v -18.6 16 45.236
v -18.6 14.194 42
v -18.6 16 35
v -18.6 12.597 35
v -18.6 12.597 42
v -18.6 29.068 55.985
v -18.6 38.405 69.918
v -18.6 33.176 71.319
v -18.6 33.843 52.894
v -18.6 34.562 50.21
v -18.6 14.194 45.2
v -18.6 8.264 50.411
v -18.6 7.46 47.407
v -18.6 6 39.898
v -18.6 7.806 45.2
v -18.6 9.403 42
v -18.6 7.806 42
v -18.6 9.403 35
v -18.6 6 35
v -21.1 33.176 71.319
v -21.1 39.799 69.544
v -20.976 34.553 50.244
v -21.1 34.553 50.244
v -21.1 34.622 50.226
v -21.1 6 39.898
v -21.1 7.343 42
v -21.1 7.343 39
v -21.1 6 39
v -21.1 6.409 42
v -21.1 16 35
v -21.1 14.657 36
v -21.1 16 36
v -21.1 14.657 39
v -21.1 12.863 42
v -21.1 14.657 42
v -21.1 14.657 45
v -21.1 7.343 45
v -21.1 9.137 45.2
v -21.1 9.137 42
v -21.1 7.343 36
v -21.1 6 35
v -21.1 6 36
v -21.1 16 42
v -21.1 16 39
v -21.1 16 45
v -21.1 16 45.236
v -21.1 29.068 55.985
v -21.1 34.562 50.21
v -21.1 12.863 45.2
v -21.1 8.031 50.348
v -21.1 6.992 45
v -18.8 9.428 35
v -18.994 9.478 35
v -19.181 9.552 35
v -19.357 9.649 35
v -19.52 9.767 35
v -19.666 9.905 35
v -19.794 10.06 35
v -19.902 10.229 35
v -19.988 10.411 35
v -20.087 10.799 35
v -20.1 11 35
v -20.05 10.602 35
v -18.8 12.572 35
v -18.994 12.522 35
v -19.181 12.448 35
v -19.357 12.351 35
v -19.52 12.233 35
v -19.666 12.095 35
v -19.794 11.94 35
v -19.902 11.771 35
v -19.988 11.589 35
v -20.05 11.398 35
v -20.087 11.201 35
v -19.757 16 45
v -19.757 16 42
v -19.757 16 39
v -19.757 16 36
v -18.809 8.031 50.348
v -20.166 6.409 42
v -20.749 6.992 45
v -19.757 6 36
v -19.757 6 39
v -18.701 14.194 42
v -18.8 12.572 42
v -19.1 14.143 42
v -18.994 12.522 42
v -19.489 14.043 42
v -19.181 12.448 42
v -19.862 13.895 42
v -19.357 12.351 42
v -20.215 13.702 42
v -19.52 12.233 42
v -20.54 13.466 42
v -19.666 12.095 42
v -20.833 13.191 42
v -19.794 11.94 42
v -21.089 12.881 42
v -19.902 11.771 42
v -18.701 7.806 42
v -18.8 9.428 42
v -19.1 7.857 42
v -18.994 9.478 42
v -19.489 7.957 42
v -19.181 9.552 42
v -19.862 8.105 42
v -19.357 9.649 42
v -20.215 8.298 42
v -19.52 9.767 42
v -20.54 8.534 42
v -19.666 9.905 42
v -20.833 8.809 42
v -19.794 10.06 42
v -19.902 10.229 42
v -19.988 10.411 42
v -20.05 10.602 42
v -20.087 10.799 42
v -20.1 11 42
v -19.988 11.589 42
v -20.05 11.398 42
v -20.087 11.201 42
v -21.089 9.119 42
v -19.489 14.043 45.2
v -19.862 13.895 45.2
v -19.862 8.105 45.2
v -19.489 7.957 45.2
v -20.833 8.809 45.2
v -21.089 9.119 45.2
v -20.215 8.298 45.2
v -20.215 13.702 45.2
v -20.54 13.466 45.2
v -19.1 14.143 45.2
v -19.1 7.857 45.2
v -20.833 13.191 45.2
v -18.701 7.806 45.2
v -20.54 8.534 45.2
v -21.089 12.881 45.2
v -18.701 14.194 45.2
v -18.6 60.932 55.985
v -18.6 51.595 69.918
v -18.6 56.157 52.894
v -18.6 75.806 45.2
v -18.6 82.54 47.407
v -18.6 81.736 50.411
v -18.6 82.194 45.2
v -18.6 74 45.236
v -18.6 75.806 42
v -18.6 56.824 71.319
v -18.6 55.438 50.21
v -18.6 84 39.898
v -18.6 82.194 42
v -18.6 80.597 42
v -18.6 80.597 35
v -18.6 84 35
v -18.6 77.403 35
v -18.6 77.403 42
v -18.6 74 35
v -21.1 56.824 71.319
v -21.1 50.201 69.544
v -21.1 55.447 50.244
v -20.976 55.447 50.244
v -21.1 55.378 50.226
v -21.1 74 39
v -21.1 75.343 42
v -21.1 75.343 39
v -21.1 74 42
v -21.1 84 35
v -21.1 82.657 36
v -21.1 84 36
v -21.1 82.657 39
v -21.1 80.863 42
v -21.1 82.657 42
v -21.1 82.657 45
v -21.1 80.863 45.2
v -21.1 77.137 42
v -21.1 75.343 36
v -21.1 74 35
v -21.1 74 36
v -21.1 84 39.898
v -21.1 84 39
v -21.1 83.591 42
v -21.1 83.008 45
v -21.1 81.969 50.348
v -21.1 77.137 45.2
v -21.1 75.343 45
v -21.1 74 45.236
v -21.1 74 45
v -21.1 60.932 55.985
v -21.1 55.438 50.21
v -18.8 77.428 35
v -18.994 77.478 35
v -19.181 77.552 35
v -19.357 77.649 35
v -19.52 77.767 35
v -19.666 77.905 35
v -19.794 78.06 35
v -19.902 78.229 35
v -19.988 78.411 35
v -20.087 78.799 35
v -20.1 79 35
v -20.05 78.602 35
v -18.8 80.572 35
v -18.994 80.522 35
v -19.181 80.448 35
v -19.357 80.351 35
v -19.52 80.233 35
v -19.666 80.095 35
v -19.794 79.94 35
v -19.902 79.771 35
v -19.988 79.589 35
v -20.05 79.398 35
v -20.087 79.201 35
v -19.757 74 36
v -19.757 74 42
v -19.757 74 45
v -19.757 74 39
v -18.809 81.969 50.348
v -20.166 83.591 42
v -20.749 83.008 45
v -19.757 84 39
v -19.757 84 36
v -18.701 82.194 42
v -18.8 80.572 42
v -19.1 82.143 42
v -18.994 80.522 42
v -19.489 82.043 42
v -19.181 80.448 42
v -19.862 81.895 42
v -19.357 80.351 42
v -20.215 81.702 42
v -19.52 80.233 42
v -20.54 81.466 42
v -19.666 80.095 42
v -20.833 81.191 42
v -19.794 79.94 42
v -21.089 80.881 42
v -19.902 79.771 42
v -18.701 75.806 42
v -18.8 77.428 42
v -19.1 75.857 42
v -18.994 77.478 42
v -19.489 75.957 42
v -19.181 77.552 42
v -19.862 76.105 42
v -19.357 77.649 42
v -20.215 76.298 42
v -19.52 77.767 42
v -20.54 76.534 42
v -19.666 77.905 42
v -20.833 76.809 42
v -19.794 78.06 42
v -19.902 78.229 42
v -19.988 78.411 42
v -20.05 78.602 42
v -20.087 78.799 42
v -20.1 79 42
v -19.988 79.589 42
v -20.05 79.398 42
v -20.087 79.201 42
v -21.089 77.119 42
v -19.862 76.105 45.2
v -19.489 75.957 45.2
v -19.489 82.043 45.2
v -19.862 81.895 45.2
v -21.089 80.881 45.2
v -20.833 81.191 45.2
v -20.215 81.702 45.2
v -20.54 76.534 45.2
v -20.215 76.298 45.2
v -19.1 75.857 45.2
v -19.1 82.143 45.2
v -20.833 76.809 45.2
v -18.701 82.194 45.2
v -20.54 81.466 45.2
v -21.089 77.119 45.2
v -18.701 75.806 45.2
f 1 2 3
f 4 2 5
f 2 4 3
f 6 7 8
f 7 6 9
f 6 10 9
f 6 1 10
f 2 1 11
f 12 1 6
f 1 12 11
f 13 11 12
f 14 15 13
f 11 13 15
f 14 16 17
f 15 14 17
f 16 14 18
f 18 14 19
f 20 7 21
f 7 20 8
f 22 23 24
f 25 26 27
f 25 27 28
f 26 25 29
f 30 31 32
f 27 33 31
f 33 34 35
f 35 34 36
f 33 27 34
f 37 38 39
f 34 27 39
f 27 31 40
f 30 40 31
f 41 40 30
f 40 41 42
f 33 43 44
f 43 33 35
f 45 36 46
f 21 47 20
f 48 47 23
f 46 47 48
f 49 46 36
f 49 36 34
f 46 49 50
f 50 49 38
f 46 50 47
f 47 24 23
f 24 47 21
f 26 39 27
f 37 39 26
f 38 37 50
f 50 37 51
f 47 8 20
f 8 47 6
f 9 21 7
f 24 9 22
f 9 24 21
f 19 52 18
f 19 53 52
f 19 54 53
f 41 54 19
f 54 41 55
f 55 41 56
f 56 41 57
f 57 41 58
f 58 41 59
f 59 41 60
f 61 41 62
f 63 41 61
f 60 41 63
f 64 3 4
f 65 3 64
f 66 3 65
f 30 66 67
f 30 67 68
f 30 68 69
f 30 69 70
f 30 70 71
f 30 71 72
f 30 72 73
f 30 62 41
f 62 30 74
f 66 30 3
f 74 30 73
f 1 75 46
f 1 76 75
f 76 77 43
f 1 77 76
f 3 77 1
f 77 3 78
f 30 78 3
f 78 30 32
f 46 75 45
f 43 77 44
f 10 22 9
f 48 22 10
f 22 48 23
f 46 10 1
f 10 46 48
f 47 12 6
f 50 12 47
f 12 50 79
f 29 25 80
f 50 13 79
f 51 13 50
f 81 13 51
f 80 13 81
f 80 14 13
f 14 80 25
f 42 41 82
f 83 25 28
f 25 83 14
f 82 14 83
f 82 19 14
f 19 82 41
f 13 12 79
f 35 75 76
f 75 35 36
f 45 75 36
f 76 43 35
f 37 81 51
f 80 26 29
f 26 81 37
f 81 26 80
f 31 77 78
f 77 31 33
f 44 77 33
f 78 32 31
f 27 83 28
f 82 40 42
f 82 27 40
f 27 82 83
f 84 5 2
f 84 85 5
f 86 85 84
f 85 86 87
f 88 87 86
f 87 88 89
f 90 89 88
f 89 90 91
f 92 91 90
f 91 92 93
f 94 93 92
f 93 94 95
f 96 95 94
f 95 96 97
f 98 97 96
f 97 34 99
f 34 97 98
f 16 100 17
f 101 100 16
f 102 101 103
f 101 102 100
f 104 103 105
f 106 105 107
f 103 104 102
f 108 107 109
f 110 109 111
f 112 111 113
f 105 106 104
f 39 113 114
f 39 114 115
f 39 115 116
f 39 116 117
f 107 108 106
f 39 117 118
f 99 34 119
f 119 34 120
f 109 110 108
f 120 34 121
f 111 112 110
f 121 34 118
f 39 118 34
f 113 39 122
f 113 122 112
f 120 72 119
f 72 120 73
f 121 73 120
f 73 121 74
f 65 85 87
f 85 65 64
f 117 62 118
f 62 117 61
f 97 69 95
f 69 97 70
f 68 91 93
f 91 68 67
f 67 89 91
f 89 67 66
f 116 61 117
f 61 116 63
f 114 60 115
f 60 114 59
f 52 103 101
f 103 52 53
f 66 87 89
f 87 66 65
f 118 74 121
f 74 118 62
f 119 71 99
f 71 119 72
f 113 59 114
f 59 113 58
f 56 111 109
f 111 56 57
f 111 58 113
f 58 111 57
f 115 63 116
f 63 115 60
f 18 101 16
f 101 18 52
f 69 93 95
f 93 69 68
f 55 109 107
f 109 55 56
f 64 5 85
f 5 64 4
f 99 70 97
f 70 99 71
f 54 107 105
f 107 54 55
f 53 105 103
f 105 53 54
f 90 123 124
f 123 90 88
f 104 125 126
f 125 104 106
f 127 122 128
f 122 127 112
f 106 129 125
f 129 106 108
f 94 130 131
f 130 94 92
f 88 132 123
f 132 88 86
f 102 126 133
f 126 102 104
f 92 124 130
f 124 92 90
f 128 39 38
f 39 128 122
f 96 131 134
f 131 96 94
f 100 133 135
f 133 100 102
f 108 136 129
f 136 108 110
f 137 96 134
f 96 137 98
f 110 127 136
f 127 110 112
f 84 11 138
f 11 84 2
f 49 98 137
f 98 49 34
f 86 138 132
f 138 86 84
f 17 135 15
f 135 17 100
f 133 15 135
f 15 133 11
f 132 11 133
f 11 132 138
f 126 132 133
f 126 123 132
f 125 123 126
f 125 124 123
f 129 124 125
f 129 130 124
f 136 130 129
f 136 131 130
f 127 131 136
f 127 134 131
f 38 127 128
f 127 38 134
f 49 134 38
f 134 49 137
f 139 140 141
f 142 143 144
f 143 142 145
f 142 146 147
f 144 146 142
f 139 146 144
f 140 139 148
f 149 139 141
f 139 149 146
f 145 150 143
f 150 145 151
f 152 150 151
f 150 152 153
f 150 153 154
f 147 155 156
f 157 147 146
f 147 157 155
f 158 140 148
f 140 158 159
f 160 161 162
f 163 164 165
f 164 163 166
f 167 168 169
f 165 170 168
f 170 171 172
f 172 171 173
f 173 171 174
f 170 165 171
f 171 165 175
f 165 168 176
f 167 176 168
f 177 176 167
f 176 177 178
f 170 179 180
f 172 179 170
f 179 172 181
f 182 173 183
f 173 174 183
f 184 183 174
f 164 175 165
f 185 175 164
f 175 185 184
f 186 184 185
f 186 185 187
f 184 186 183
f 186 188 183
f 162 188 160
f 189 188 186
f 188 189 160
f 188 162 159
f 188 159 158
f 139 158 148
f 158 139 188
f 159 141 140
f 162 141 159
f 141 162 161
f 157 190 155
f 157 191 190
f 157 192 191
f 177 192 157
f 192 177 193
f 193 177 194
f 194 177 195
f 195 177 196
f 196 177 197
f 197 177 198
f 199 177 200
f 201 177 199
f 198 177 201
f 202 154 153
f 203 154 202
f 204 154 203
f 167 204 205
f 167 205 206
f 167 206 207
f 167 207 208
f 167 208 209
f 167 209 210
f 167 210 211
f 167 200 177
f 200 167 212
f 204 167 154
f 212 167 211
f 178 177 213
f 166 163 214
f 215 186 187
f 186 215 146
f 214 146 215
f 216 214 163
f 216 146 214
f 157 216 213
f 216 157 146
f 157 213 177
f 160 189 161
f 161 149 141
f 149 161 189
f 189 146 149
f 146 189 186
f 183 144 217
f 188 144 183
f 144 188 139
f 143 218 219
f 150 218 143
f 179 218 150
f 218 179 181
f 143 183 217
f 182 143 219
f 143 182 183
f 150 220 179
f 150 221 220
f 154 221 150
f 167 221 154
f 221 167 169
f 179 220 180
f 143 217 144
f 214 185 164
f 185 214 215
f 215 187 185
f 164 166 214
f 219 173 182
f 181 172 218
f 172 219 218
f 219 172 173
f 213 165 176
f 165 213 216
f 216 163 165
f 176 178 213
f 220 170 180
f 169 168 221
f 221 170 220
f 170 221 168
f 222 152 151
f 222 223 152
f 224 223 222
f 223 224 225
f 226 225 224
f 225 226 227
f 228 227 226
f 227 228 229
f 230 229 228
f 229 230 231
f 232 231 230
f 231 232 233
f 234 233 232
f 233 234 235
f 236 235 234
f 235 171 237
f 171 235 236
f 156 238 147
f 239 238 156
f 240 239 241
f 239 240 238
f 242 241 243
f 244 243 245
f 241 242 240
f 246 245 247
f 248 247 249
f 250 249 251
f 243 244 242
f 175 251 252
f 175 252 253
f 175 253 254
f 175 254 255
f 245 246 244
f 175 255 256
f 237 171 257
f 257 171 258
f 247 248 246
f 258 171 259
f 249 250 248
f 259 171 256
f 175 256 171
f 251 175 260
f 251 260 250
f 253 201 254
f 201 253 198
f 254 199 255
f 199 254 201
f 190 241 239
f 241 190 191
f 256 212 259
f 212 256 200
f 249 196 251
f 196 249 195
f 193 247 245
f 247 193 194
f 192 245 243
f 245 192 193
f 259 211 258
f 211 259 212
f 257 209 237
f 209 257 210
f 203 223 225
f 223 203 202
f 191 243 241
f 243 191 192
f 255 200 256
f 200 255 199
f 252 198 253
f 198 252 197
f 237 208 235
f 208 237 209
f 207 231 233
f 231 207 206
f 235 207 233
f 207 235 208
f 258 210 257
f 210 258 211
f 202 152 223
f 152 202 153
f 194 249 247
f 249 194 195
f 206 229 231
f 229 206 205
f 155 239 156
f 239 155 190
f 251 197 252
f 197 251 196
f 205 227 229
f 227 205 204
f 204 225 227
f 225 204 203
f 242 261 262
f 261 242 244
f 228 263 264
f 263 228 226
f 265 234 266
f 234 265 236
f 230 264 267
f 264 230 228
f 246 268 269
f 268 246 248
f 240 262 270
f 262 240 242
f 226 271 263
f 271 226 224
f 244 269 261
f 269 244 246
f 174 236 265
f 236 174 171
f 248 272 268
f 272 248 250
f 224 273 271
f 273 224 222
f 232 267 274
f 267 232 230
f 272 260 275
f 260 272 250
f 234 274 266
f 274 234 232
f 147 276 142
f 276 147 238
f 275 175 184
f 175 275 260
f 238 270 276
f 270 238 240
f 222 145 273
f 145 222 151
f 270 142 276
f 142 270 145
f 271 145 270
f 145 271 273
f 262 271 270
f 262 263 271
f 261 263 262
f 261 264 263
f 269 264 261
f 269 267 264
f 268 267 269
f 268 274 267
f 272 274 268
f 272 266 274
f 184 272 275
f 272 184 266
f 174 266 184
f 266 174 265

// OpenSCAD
// PRUSA iteration3
// Cable holder
// GNU GPL v3
// Josef Průša <iam@josefprusa.cz> and contributors
// http://www.reprap.org/wiki/Prusa_Mendel
// http://prusamendel.org

module cable_holder()
{
    difference()
    {
    union()
    {
        // body
        translate([-21.1,3,35]) cube([2.5,13,13]);
        translate([-21.1,3,49]) rotate([-75,0,0]) cube([2.5,7,30.8]);

        difference()
        {
        translate([-21.1,3+25,52]) rotate([-15,0,0]) cube([2.5,7,20]);
        rotate([-15,0,0]) translate([-18.6,19
        ,45]) rotate([0,0,60]) cube([3,3,35]);
        }
    }

    // side angle cut
    translate([-22,-1.5,38]) rotate([-11,0,0]) cube([5,7,45]);

    // side cut
    translate([-22,-2,33]) cube([8,8,12]);

    // angled side cut
    rotate([-15,0,0]) translate([-18,-8,39]) rotate([0,0,45]) cube([3.5,2.5,35]);

    //zipties
    translate([-25,15,42]) rotate([0,0,-45]) cube([3,10,3]);
    translate([-20,2,42]) rotate([0,0,45]) cube([3,10,3]);
    translate([-25,15,36]) rotate([0,0,-45]) cube([3,10,3]);
    translate([-20,2,36]) rotate([0,0,45]) cube([3,10,3]);

    // M3 screw
    translate([-18.5,11,19]) rotate([0,0,0])cylinder(r=1.6, h=23, $fn=50); 
    translate([-18.5,11,42]) rotate([0,0,0])cylinder(r=3.2, h=3.2, $fn=50);     

    // bottom cut
    translate([-21.6,-9,25]) cube([4,26,10]);    

    //selective infill
    //translate([-20.8,11.5,46]) rotate([-15,0,0]) cube([2,0.4,10]);
    //translate([-20.8,10,46]) rotate([-15,0,0]) cube([2,0.4,18]);
    //translate([-20.8,8.5,46]) rotate([-15,0,0]) cube([2,0.4,10]);
    }
}

cable_holder();
translate([0,90,0]) rotate([0,180,180]) mirror([0,0,1]) cable_holder();
